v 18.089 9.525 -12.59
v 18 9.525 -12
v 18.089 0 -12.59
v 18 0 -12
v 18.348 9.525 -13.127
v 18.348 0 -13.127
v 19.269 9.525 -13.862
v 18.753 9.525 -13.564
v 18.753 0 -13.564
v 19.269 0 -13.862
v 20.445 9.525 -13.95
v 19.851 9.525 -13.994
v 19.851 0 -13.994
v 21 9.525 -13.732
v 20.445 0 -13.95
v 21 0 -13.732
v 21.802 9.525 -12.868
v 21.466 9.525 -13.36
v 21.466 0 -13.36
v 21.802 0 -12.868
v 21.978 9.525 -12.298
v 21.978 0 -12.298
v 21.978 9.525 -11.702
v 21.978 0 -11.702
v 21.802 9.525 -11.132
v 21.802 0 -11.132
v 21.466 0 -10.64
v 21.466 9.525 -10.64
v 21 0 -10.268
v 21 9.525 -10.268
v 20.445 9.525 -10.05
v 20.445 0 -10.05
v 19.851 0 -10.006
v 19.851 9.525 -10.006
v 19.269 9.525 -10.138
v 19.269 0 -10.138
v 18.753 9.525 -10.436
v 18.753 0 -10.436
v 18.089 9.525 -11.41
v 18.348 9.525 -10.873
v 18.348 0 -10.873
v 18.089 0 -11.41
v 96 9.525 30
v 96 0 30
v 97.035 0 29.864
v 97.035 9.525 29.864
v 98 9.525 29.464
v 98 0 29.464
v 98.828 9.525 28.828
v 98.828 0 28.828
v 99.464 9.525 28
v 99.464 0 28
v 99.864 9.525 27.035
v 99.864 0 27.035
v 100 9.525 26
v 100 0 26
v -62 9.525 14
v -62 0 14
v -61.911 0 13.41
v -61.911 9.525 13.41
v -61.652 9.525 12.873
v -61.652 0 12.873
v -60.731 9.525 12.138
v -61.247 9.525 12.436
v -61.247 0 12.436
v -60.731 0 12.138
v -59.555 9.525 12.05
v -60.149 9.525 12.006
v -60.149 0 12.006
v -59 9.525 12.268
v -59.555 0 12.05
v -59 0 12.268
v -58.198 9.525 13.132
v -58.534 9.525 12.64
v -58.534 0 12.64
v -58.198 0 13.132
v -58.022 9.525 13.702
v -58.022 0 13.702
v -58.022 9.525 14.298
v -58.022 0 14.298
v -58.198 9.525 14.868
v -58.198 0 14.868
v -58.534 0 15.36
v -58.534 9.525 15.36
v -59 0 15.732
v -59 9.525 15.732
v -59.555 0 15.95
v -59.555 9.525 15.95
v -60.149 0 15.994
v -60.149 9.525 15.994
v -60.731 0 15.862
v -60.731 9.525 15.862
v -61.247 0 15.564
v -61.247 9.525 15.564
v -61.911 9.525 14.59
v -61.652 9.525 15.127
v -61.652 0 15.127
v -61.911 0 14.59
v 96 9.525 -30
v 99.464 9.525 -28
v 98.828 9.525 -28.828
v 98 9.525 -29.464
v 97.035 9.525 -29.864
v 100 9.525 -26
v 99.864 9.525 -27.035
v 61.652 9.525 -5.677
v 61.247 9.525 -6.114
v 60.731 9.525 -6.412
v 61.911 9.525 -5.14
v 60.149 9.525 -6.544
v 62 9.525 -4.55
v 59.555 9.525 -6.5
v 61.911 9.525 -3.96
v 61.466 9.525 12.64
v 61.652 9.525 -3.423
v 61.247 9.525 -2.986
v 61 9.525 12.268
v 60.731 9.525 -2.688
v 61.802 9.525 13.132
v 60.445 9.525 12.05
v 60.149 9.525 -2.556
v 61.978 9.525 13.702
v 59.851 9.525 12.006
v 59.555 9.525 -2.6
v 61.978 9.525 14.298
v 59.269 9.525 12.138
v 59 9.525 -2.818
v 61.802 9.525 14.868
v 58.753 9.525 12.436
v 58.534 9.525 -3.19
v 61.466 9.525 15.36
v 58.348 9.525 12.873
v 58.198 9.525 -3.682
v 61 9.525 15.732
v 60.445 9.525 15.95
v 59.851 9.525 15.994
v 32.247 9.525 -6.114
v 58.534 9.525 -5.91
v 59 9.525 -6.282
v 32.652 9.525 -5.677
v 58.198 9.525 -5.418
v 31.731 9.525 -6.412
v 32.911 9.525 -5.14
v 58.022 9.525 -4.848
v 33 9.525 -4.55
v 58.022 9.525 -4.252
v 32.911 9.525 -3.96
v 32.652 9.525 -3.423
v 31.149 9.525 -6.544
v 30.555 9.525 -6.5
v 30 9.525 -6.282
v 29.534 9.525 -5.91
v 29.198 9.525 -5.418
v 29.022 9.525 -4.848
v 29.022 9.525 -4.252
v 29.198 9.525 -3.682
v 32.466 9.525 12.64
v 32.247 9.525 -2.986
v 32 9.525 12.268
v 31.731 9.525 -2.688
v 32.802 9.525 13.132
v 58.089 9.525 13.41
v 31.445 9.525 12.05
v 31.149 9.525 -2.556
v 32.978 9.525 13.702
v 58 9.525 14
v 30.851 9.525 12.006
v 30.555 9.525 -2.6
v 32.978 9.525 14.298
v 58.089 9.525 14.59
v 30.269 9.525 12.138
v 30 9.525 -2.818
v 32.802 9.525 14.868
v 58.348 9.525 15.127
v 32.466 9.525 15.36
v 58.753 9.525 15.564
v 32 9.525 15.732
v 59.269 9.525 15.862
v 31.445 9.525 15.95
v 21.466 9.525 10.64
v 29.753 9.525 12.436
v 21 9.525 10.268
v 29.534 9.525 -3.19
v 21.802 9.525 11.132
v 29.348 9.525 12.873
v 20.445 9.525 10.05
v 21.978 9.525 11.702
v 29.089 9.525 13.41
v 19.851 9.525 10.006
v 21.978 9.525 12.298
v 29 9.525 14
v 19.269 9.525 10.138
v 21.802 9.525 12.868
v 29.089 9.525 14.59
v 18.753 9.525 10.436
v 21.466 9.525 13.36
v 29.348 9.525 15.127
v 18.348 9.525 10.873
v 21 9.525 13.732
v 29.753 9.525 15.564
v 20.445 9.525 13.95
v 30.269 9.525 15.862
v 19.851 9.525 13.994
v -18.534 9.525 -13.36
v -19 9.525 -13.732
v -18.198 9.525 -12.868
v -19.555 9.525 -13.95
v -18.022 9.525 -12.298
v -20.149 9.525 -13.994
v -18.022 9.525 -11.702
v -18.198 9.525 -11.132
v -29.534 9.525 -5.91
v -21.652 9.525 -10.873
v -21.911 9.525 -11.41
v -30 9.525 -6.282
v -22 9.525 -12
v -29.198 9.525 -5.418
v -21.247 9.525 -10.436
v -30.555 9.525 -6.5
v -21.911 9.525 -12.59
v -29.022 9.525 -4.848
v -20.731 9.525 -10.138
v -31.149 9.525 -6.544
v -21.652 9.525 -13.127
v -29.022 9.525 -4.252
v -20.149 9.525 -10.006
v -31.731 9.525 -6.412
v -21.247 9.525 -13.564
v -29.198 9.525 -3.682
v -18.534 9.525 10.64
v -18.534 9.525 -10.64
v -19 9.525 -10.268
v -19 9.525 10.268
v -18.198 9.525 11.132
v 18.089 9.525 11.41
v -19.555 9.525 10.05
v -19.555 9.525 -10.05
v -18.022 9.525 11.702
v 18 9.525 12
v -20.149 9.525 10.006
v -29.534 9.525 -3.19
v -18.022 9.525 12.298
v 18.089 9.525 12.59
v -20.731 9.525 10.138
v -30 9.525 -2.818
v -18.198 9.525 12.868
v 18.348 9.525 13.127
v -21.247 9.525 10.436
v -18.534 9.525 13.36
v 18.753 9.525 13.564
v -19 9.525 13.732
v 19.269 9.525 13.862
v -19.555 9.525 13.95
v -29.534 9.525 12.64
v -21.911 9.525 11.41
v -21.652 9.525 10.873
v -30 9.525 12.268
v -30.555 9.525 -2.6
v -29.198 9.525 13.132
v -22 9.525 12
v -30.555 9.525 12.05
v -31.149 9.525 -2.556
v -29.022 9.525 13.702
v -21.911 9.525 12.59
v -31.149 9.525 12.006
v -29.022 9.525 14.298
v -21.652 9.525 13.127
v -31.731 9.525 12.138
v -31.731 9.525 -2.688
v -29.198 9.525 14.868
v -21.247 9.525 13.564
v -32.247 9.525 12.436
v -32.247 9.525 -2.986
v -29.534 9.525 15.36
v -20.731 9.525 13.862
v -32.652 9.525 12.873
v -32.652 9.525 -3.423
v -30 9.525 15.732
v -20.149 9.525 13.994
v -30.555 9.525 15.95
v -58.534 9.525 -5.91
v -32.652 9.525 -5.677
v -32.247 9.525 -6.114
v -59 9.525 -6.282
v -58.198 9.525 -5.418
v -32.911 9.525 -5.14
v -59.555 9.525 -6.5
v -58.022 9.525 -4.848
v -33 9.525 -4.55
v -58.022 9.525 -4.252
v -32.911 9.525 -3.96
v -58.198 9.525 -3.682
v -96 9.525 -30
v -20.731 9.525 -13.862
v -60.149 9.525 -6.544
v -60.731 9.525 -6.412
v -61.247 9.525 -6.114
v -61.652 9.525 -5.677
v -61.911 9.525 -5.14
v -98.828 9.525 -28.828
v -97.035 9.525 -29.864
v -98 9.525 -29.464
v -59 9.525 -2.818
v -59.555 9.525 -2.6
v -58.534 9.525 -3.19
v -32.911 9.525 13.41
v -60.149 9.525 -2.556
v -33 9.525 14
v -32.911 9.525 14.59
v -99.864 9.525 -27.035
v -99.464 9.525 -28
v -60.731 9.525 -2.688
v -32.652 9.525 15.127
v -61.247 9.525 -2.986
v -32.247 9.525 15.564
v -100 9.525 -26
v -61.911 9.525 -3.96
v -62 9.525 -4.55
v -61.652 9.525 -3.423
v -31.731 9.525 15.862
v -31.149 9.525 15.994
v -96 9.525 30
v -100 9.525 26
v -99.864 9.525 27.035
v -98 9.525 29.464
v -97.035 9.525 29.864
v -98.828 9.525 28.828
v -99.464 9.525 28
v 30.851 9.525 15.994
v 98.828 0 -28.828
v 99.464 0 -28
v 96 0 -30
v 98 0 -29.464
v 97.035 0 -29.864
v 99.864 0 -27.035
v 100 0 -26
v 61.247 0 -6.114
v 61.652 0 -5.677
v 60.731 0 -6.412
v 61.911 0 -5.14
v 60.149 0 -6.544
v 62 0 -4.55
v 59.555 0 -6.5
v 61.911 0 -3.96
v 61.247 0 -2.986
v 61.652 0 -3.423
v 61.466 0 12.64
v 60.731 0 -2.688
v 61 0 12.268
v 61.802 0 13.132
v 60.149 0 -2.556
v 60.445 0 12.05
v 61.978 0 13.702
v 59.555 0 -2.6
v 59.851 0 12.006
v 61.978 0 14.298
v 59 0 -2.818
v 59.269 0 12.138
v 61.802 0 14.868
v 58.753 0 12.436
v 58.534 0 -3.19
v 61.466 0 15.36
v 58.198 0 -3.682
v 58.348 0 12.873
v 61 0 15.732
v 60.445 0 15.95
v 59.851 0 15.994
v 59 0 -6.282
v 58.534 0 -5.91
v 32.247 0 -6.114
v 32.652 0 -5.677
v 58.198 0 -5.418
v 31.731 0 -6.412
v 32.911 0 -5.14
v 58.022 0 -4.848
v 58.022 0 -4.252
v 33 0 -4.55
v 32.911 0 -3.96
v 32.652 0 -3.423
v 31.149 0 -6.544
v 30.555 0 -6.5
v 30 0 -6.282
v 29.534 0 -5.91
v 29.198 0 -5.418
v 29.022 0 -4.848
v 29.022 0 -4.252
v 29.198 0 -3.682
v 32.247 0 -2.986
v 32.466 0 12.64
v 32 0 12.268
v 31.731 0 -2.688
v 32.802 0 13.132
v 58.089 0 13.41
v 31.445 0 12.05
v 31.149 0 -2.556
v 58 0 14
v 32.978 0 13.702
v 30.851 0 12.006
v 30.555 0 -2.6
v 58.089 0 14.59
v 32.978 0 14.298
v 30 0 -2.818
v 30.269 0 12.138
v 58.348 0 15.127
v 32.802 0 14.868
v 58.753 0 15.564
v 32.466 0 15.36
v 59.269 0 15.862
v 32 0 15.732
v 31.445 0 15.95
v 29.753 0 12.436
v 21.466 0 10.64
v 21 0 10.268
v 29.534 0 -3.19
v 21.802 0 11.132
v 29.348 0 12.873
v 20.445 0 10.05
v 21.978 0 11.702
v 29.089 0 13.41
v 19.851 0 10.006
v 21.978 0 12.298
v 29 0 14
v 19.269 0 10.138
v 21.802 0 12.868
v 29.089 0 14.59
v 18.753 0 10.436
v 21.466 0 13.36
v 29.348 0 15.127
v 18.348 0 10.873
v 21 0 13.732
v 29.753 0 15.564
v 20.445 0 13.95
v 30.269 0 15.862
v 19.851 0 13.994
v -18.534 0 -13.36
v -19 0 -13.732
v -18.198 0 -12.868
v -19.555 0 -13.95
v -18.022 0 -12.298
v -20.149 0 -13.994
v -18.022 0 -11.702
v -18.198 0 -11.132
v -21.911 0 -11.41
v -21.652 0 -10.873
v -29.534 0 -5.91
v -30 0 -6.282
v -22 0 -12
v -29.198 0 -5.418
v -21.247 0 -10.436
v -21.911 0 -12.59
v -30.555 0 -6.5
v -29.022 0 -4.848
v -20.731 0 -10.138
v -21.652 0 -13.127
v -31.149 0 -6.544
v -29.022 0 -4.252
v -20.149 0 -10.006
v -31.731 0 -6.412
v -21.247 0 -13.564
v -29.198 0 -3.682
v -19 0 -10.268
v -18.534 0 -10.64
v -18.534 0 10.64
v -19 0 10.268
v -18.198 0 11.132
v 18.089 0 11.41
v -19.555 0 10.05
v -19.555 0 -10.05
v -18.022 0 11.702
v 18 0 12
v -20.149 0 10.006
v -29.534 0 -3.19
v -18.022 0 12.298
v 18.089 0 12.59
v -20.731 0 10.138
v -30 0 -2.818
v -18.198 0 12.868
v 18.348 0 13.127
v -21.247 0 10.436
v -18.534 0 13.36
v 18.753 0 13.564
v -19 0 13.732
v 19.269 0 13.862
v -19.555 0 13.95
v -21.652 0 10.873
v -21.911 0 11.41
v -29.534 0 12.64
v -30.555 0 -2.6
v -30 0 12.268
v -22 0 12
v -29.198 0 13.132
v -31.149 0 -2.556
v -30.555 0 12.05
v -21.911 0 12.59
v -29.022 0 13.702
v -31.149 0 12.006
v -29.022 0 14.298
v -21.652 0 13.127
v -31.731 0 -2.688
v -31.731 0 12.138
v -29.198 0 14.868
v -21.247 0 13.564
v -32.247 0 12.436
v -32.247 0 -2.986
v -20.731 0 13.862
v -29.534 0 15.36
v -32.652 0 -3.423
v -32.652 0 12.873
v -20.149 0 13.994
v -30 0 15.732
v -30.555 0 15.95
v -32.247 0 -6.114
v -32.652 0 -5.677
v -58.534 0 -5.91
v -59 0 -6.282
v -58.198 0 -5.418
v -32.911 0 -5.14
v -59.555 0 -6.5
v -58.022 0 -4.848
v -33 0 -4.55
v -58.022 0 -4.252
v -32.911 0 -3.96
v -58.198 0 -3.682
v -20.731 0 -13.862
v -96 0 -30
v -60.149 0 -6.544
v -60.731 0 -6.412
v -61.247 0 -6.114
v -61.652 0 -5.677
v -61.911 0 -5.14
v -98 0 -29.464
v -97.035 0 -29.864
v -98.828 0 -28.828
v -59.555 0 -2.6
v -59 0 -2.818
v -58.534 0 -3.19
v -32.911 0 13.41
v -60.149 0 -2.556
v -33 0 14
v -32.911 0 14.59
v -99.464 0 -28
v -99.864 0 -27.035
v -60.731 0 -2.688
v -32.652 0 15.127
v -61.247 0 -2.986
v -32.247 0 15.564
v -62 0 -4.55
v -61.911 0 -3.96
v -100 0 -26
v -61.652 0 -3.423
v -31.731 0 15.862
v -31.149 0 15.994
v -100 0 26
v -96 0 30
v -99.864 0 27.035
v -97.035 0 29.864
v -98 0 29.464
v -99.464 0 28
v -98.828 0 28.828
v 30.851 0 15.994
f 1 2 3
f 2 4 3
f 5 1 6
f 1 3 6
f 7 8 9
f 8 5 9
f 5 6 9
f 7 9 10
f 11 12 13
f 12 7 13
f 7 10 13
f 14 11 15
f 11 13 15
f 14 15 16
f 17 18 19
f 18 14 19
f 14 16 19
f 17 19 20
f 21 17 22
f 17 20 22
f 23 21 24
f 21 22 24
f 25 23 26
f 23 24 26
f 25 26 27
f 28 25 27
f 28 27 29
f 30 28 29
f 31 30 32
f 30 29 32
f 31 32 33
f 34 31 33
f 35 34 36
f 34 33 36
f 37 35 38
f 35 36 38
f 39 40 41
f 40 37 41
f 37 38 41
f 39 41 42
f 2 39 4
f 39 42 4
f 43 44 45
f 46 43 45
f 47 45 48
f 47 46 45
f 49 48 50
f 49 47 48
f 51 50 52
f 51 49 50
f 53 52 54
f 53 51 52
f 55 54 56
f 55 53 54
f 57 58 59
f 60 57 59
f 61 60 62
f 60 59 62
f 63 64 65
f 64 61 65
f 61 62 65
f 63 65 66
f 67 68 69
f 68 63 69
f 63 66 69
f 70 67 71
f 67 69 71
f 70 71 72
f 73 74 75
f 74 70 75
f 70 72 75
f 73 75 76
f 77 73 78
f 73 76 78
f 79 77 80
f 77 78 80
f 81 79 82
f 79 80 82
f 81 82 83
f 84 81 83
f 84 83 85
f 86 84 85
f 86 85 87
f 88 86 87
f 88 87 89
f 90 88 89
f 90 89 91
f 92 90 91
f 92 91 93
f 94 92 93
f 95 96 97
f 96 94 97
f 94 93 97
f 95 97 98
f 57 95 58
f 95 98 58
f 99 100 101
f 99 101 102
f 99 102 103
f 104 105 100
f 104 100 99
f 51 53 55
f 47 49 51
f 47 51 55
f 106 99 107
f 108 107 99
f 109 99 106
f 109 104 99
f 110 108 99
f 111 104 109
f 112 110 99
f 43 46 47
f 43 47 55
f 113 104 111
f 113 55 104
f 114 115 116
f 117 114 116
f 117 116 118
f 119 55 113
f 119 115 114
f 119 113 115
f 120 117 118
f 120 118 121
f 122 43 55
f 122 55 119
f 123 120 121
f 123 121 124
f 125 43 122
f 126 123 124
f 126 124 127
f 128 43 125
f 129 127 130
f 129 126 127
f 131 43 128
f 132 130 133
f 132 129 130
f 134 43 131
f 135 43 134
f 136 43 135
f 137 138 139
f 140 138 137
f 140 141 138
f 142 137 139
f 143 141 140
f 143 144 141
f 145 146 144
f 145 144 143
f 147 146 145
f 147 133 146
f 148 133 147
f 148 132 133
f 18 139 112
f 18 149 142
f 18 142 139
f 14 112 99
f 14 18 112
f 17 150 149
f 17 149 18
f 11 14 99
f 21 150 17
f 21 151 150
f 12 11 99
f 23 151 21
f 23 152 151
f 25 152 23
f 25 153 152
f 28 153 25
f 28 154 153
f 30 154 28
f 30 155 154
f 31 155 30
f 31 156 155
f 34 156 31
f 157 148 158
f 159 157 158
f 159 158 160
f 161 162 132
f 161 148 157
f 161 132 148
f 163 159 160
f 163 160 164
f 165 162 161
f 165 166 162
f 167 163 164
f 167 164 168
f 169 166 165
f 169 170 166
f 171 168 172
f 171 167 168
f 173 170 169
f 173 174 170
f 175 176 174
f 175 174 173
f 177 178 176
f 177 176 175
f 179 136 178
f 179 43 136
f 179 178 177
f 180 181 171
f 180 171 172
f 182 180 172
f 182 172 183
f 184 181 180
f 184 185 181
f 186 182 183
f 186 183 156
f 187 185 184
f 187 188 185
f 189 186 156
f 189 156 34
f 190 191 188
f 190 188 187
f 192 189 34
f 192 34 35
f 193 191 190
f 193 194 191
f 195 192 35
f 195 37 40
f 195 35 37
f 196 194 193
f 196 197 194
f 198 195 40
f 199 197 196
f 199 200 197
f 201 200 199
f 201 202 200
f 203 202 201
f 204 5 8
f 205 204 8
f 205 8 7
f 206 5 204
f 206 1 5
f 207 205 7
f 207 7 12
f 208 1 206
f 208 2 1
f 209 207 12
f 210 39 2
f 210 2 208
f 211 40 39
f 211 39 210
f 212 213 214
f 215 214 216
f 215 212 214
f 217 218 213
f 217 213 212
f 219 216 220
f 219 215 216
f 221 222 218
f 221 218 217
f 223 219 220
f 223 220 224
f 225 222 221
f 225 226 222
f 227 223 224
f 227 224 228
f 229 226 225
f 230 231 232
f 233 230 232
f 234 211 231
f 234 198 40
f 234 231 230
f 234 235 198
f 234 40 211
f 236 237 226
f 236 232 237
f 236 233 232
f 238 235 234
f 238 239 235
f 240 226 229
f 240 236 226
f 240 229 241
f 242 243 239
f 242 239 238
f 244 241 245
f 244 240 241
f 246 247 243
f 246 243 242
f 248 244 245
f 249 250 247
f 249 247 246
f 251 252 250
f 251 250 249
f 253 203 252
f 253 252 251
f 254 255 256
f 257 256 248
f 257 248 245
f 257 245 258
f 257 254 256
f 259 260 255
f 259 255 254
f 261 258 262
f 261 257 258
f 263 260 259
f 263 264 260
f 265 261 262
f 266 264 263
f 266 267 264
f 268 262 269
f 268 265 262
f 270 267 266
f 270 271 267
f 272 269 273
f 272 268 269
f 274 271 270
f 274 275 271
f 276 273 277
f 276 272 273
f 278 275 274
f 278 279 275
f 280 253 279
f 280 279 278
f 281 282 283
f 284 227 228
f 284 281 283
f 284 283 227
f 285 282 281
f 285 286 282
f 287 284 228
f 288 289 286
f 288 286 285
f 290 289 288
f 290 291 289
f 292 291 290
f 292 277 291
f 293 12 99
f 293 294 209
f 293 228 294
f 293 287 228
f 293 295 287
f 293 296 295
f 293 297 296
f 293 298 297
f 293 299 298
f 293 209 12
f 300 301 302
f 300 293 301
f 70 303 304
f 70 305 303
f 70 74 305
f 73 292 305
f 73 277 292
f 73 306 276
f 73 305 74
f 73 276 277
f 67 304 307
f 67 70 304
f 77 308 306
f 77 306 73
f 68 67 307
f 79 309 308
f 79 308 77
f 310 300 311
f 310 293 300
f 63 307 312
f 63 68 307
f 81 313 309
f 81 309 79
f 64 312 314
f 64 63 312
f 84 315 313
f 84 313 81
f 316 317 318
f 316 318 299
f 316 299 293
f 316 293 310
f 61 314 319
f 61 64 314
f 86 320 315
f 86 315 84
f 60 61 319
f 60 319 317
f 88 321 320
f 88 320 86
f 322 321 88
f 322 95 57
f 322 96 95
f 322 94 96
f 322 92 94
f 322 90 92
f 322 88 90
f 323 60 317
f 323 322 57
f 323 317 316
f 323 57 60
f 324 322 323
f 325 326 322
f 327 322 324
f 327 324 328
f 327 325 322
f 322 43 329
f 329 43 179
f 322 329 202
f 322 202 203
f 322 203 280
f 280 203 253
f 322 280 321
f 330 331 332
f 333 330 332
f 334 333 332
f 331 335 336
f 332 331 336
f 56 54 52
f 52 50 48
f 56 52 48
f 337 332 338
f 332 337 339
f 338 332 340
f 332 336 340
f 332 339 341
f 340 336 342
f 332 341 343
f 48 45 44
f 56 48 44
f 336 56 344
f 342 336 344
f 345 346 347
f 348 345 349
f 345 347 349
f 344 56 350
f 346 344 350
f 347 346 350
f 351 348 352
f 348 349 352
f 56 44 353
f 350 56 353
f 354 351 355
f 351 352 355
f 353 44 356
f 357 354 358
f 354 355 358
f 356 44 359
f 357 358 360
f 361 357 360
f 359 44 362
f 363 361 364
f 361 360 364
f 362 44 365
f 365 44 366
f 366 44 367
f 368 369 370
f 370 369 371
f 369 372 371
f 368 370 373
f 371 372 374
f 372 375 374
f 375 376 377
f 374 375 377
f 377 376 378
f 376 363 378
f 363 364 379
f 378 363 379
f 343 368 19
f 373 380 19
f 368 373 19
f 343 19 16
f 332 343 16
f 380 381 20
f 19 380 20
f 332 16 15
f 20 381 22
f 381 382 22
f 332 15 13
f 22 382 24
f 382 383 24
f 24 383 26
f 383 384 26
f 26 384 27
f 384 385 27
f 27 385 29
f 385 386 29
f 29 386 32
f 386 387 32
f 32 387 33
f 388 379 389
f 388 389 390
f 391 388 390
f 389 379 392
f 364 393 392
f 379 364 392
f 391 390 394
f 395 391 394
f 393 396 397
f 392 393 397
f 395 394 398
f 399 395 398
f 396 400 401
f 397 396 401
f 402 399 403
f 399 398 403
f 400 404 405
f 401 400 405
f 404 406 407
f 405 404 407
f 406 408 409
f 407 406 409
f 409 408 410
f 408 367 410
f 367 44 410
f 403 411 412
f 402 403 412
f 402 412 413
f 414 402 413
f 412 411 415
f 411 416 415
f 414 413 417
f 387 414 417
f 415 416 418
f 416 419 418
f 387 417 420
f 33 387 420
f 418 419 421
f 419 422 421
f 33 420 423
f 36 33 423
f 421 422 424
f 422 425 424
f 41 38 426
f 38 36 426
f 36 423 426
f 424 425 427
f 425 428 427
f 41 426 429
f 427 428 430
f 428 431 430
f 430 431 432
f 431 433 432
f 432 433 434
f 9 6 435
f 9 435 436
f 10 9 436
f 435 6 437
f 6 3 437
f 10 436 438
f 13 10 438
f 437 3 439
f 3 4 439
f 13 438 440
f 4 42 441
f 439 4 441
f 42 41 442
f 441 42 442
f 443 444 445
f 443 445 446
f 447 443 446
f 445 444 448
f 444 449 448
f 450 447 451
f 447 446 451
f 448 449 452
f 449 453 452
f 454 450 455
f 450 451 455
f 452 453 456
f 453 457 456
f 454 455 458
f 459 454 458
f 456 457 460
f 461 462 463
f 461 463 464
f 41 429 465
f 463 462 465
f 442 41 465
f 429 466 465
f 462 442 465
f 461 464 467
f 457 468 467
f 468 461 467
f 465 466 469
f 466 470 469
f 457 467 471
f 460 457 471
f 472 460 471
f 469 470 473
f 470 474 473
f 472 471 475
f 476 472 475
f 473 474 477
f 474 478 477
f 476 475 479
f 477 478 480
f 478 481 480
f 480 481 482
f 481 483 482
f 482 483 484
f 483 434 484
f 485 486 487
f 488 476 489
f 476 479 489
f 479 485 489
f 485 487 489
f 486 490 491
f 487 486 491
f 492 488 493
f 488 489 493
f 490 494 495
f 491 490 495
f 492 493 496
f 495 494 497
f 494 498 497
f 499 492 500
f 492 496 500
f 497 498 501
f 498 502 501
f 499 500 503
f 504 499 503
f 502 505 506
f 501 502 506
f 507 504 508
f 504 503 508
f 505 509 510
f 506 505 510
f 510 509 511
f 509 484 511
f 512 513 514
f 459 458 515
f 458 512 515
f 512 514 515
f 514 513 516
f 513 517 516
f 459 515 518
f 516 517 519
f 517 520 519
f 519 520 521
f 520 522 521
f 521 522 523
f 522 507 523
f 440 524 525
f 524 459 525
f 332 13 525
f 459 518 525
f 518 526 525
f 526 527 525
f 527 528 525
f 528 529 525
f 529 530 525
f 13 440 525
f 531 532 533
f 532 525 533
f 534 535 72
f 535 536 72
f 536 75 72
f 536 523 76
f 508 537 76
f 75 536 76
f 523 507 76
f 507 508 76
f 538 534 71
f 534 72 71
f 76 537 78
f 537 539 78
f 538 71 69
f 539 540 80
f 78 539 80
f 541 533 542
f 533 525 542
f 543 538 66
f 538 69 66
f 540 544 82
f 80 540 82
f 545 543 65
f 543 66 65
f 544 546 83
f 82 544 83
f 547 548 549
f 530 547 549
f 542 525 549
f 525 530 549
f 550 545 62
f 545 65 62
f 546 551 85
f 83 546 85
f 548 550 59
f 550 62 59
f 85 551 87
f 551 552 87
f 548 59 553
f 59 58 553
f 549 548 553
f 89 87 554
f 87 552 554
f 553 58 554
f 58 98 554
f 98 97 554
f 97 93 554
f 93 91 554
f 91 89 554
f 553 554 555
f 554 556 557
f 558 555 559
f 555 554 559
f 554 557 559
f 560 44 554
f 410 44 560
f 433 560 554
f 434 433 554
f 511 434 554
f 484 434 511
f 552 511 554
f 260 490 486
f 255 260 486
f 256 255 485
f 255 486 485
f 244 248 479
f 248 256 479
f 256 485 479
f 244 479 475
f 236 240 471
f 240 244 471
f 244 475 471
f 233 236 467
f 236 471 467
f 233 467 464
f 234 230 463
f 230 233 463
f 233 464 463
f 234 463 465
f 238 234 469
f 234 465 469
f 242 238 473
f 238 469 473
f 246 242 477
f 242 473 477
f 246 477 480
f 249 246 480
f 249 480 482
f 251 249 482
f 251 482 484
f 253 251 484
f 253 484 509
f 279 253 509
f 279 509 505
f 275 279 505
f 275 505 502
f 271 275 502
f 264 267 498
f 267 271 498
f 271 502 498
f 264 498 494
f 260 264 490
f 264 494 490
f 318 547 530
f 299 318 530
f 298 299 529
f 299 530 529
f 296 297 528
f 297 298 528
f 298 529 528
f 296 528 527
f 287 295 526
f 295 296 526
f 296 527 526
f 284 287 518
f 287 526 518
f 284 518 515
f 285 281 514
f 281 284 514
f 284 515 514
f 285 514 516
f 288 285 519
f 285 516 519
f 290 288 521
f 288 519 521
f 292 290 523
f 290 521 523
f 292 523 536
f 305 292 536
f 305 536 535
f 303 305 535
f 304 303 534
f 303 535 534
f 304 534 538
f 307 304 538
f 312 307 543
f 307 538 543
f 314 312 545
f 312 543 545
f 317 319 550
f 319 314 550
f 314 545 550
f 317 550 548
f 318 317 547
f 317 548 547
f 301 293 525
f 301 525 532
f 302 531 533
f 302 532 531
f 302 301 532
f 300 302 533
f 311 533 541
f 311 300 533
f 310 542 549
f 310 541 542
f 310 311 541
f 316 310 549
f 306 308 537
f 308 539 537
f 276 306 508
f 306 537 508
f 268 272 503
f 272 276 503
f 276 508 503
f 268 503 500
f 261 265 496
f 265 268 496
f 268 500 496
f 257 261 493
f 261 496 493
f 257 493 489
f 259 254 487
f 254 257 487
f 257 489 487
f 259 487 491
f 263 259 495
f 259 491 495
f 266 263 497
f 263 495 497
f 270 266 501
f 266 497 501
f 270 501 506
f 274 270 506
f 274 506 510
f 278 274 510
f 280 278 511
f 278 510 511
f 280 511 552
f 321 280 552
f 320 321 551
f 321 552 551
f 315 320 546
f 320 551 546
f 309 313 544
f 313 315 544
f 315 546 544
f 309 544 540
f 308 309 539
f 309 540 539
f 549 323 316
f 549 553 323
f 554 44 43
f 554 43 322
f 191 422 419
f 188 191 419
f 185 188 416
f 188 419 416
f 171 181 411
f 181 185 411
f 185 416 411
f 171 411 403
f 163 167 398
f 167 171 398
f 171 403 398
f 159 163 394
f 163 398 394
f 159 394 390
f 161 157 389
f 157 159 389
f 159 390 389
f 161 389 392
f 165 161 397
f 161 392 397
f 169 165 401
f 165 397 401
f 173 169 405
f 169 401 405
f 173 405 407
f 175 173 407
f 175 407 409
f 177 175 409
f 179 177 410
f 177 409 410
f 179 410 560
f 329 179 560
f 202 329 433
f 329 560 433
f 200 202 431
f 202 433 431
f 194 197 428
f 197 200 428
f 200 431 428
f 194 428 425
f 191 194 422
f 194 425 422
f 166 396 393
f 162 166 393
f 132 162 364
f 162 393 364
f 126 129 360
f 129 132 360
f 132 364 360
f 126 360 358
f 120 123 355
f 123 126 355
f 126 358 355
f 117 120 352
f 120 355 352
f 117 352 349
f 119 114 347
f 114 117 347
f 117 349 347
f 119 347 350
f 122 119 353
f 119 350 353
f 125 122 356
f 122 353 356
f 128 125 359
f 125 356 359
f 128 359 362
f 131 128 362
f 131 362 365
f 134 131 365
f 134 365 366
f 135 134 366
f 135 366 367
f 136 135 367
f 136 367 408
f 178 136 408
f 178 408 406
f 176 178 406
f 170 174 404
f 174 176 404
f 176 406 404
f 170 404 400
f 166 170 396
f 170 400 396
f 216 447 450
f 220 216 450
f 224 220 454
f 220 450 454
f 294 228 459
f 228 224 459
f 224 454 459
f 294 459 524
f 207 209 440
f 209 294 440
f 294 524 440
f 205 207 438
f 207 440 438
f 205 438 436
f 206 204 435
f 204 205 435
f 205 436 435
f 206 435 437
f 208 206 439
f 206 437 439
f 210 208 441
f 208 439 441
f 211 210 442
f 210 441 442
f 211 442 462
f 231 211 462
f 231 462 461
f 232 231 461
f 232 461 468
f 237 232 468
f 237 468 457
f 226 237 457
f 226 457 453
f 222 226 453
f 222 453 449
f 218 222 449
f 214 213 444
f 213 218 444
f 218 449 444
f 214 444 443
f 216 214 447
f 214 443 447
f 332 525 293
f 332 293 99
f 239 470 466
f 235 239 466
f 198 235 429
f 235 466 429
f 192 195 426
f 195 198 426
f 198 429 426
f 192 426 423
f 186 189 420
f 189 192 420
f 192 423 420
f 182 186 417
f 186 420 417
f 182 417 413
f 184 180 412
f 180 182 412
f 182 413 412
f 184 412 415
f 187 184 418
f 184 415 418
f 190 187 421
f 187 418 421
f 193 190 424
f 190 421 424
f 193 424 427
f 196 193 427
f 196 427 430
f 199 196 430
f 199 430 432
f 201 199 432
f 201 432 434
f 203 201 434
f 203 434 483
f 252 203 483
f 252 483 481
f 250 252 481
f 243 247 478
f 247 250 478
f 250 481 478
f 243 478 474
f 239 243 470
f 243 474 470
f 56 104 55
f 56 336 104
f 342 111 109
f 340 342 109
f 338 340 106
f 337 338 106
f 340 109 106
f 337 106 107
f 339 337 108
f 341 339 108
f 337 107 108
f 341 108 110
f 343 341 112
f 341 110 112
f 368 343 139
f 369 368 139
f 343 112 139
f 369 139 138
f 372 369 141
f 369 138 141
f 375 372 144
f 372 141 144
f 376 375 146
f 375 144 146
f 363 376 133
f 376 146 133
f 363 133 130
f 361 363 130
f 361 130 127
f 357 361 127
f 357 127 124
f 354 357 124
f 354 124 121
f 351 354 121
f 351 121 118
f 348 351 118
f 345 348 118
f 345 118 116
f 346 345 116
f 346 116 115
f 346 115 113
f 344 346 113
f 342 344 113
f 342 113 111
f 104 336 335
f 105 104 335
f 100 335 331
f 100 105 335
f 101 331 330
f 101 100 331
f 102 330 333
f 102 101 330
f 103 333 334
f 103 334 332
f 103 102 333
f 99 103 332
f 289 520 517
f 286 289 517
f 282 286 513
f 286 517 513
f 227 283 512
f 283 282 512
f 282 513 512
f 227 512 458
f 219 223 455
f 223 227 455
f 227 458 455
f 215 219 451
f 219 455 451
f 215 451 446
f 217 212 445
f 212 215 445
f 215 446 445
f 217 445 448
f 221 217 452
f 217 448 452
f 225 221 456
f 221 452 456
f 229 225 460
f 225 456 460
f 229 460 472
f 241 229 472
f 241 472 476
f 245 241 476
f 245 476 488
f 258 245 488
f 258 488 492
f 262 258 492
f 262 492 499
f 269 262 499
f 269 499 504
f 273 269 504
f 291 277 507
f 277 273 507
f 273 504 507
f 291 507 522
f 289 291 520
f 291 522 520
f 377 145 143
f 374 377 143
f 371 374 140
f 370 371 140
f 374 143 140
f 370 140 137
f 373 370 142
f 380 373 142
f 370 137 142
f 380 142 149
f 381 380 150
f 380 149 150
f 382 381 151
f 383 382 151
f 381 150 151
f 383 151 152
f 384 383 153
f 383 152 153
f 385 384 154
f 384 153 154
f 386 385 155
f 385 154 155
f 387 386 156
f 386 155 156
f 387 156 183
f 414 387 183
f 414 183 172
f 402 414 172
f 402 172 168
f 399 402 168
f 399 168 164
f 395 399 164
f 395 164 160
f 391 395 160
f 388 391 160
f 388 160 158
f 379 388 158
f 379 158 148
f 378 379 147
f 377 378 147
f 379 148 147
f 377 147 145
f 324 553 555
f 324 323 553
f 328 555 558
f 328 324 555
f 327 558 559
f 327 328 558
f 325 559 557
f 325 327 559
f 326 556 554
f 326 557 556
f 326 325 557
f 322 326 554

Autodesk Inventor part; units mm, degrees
ref_plane "YZ Plane" through (0, 0, 0) normal (1, 0, 0) x (0, 1, 0)
ref_plane "XZ Plane" through (0, 0, 0) normal (0, 1, 0) x (-1, 0, 0)
ref_plane "XY Plane" through (0, 0, 0) normal (0, 0, 1) x (1, 0, 0)
sketch "Sketch1" plane through (0, 0, 0) normal (0, 1, 0) x (-1, 0, 0)
  line L0 (-100, 30) -> (100, 30)
  line L1 (100, 30) -> (100, -30)
  line L2 (100, -30) -> (-100, -30)
  line L3 (-100, -30) -> (-100, 30)
  circle A0 centre (60, 14) radius 2
  circle A1 centre (31, 14) radius 2
  circle A2 centre (-31, 14) radius 2
  circle A3 centre (-60, 14) radius 2
  circle A4 centre (20, 12) radius 2
  circle A5 centre (-20, 12) radius 2
  circle A6 centre (60, -4.55) radius 2
  circle A7 centre (31, -4.55) radius 2
  circle A8 centre (20, -12) radius 2
  circle A9 centre (-20, -12) radius 2
  circle A10 centre (-31, -4.55) radius 2
  circle A11 centre (-60, -4.55) radius 2
  point P0 (0, 0)
  dimension "d0" = 200
  dimension "d1" = 60
  dimension "d7" = 4
  dimension "d12" = 4
  dimension "d15" = 4
  dimension "d16" = 4
  dimension "d18" = 4
  dimension "d19" = 4
  dimension "d23" = 4
  dimension "d24" = 4
  dimension "d25" = 18.55
  dimension "d30" = 100
extrude "Extrusion1" add sketch "Sketch1" along normal blind 9.525 contours L0 L1 L2 L3 | A10 | A11
fillet "Fillet1" radius 4 4 edges at (100, 4.7625, -30) (-100, 4.7625, -30) (100, 4.7625, 30) (-100, 4.7625, 30)
sketch "Sketch2" plane through (0, 9.525, 0) normal (0, 1, 0) x (1, 0, 0)
  circle A0 centre (31, -14) radius 2 projected
  circle A1 centre (60, -14) radius 2 projected
  circle A2 centre (31, 4.55) radius 2
  circle A3 centre (60, 4.55) radius 2
  point P0 (0, 0)
  dimension "d26" = 4
  dimension "d27" = 4
extrude "Extrusion2" cut sketch "Sketch2" against normal blind 9.525 contours A2 | A3
properties part number "Placa Herramienta"
